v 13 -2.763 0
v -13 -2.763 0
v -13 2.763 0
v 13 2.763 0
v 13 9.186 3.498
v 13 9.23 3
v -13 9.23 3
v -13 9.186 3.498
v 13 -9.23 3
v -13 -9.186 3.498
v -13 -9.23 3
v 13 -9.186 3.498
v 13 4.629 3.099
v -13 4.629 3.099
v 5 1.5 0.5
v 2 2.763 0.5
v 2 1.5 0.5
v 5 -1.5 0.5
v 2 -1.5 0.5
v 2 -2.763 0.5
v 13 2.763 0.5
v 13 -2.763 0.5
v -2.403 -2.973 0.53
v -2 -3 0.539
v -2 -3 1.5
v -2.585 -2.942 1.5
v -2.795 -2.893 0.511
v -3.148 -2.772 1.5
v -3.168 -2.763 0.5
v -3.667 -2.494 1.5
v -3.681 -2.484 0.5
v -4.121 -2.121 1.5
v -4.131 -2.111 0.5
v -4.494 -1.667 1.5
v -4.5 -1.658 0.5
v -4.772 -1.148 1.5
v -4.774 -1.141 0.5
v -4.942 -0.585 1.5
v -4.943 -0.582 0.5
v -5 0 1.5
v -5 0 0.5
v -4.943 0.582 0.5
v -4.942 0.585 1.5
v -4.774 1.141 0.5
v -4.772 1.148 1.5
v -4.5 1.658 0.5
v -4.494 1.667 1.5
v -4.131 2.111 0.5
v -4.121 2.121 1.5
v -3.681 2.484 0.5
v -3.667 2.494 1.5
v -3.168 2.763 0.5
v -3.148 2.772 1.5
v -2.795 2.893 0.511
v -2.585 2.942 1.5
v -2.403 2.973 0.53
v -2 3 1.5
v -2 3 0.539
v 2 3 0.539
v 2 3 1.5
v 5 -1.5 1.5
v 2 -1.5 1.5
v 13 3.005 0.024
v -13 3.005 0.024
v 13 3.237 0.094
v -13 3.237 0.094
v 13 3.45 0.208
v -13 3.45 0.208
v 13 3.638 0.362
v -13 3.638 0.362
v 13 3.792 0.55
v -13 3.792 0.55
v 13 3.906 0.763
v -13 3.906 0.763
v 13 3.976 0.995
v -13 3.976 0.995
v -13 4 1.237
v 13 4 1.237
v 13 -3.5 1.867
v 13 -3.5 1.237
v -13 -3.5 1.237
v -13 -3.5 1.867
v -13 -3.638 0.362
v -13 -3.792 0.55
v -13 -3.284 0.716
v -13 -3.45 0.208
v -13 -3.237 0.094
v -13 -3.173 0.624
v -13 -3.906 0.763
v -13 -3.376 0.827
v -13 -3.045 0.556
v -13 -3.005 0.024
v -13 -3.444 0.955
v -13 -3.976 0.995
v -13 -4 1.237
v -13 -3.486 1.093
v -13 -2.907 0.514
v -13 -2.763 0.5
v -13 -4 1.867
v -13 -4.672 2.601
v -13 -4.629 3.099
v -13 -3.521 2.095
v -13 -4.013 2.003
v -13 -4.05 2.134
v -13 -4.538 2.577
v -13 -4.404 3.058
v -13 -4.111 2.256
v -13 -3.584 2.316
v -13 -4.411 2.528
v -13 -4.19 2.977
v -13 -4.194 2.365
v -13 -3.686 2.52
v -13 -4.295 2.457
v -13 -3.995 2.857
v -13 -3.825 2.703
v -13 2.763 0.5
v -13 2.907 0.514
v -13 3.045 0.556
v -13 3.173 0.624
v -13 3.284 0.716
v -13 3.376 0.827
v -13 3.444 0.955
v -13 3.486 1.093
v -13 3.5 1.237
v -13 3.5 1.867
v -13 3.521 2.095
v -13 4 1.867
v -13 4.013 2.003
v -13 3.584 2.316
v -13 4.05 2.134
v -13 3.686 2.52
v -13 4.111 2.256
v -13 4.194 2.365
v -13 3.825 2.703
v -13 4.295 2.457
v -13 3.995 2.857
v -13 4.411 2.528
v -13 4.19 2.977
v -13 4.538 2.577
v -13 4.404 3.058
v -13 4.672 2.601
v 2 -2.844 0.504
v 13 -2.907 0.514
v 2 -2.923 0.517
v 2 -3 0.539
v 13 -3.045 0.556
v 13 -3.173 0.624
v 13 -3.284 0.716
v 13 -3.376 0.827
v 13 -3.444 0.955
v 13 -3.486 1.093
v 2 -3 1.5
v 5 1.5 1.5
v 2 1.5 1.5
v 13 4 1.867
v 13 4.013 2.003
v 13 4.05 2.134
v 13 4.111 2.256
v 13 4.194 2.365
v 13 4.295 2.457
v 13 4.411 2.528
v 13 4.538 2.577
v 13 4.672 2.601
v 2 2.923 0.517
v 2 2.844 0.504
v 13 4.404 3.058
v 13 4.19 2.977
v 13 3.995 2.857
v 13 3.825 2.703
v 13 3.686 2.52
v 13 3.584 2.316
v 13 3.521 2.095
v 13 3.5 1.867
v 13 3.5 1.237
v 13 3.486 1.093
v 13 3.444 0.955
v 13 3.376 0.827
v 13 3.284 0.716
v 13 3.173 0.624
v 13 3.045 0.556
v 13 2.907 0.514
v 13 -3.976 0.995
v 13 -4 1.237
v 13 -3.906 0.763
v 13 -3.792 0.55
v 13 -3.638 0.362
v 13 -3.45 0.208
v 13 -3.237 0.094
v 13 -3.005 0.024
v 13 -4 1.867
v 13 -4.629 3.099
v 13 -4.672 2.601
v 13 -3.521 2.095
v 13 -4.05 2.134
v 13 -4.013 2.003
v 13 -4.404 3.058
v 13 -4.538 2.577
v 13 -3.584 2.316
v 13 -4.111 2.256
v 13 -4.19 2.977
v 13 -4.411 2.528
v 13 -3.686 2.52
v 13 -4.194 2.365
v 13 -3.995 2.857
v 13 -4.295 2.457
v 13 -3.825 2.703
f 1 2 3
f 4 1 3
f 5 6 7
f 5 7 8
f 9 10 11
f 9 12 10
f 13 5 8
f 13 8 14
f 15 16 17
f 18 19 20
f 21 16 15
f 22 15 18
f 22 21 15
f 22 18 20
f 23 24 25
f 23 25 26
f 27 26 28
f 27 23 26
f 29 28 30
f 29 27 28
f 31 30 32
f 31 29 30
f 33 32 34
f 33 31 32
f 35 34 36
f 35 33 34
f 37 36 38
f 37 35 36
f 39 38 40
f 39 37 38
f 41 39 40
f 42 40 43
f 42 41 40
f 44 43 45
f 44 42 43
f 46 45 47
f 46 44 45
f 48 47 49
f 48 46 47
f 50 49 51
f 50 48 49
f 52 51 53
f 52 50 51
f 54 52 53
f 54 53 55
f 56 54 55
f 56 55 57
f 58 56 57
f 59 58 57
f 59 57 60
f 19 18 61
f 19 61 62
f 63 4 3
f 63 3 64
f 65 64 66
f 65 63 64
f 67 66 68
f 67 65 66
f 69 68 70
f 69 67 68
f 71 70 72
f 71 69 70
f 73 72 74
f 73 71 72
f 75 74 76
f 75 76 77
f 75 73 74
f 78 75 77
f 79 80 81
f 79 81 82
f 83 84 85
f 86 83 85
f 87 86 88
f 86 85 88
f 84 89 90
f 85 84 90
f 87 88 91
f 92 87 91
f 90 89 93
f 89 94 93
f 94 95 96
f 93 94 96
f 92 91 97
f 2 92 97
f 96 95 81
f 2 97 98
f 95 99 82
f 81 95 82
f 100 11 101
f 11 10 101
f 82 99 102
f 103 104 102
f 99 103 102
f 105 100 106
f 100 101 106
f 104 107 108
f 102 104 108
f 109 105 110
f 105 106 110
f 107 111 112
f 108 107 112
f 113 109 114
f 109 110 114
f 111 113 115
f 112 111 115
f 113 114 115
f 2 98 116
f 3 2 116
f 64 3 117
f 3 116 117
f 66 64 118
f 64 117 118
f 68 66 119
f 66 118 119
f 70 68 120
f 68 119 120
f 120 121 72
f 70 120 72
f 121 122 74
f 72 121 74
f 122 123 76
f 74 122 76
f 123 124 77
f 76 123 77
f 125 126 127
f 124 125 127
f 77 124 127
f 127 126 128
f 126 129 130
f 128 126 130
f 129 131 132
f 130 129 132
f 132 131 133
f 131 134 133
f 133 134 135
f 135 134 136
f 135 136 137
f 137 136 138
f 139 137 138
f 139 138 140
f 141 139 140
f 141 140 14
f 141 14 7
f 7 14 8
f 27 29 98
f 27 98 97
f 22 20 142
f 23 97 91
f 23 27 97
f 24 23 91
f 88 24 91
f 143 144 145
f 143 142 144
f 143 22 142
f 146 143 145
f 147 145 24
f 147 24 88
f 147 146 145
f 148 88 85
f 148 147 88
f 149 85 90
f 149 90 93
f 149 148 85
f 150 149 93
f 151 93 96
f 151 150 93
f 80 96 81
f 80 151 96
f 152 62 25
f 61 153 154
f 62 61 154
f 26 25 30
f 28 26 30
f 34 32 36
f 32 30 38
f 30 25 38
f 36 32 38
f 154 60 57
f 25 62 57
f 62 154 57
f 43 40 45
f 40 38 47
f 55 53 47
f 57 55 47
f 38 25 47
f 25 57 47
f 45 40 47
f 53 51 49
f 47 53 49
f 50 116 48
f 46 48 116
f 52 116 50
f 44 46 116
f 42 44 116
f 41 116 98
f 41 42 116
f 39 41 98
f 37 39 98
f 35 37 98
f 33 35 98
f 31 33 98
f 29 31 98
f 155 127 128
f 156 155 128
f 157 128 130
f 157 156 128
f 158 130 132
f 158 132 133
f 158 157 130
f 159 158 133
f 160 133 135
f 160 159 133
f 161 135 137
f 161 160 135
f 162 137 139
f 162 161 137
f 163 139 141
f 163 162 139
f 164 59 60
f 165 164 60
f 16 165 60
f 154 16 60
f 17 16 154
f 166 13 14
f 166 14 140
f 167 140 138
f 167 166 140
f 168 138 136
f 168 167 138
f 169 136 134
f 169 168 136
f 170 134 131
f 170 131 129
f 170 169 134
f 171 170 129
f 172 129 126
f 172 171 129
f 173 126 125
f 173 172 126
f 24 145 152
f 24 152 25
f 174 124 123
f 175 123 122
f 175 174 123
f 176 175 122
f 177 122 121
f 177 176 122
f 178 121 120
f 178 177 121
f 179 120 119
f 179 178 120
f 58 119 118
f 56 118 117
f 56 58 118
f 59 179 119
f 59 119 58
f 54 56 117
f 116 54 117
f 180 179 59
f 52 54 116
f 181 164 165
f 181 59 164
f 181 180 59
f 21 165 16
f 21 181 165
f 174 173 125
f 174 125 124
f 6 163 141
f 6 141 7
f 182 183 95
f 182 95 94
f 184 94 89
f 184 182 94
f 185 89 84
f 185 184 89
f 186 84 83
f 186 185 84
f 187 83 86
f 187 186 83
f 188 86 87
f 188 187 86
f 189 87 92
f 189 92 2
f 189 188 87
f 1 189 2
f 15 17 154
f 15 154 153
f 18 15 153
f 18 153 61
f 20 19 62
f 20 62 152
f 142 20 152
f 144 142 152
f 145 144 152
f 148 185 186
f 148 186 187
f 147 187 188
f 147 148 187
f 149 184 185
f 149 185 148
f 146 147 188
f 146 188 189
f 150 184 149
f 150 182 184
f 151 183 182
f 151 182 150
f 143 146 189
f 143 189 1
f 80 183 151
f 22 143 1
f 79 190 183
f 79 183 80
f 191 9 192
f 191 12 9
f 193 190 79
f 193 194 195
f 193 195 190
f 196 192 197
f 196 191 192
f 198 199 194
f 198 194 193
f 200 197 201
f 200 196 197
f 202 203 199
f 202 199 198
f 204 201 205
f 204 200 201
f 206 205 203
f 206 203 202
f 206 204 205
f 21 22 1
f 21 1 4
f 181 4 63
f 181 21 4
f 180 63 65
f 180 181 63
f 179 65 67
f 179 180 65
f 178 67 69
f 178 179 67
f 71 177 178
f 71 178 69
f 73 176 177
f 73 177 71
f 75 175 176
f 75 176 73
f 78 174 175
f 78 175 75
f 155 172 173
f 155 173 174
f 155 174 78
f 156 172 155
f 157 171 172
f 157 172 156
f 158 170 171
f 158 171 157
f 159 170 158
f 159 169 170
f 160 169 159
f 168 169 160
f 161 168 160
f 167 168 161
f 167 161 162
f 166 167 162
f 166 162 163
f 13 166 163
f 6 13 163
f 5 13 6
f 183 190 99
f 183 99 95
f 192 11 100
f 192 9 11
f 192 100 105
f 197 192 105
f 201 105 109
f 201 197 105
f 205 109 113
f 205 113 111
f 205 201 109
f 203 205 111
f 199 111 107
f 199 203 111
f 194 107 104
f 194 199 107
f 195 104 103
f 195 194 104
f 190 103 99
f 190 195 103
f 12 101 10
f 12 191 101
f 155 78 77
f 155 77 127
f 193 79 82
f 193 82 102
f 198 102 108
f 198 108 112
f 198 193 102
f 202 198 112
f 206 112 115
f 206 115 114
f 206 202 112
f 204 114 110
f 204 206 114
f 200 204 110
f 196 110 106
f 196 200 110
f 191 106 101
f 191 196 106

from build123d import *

# Parameters (mm, degrees)
BASE_FLANGE1_DEPTH  = 13
BOSS_EXTRUDE2_DEPTH = 1


# Sheet-metal steps are written as plain solids
with BuildPart() as part:
    # Sketch1 → Base-Flange1 (new, symmetric)
    with BuildSketch(Plane.YZ):
        with BuildLine():
            Line((-9.23, 3), (-4.67240108, 2.601261762))
            ThreePointArc((-4.67240108, 2.601261762), (-4.193521514, 2.365104494), (-4, 1.867464747))
            Line((-4, 1.867464747), (-4, 1.2366))
            ThreePointArc((-4, 1.2366), (-3.637808246, 0.362191754), (-2.7634, 0))
            Line((-2.7634, 0), (2.7634, 0))
            ThreePointArc((2.7634, 0), (3.637808246, 0.362191754), (4, 1.2366))
            Line((4, 1.2366), (4, 1.867464747))
            ThreePointArc((4, 1.867464747), (4.193521514, 2.365104494), (4.67240108, 2.601261762))
            Line((4.67240108, 2.601261762), (9.23, 3))
            Line((9.23, 3), (9.186422129, 3.498097349))
            Line((9.186422129, 3.498097349), (4.628823209, 3.099359111))
            ThreePointArc((4.628823209, 3.099359111), (3.824882845, 2.702899598), (3.5, 1.867464747))
            Line((3.5, 1.867464747), (3.5, 1.2366))
            ThreePointArc((3.5, 1.2366), (3.284254855, 0.715745145), (2.7634, 0.5))
            Line((2.7634, 0.5), (-2.7634, 0.5))
            ThreePointArc((-2.7634, 0.5), (-3.284254855, 0.715745145), (-3.5, 1.2366))
            Line((-3.5, 1.2366), (-3.5, 1.867464747))
            ThreePointArc((-3.5, 1.867464747), (-3.824882845, 2.702899598), (-4.628823209, 3.099359111))
            Line((-4.628823209, 3.099359111), (-9.186422129, 3.498097349))
            Line((-9.186422129, 3.498097349), (-9.23, 3))
        make_face()
    extrude(amount=BASE_FLANGE1_DEPTH, both=True)

    # Sketch6 → Boss-Extrude2 (add)
    with BuildSketch(Plane.XY.offset(0.5)):
        with BuildLine():
            Line((-2, 3), (2, 3))
            Line((2, 3), (2, 1.5))
            Line((2, 1.5), (5, 1.5))
            Line((5, 1.5), (5, -1.5))
            Line((5, -1.5), (2, -1.5))
            Line((2, -1.5), (2, -3))
            Line((2, -3), (-2, -3))
            ThreePointArc((-2, -3), (-5, 0), (-2, 3))
        make_face()
    extrude(amount=BOSS_EXTRUDE2_DEPTH)


solid = part.part
